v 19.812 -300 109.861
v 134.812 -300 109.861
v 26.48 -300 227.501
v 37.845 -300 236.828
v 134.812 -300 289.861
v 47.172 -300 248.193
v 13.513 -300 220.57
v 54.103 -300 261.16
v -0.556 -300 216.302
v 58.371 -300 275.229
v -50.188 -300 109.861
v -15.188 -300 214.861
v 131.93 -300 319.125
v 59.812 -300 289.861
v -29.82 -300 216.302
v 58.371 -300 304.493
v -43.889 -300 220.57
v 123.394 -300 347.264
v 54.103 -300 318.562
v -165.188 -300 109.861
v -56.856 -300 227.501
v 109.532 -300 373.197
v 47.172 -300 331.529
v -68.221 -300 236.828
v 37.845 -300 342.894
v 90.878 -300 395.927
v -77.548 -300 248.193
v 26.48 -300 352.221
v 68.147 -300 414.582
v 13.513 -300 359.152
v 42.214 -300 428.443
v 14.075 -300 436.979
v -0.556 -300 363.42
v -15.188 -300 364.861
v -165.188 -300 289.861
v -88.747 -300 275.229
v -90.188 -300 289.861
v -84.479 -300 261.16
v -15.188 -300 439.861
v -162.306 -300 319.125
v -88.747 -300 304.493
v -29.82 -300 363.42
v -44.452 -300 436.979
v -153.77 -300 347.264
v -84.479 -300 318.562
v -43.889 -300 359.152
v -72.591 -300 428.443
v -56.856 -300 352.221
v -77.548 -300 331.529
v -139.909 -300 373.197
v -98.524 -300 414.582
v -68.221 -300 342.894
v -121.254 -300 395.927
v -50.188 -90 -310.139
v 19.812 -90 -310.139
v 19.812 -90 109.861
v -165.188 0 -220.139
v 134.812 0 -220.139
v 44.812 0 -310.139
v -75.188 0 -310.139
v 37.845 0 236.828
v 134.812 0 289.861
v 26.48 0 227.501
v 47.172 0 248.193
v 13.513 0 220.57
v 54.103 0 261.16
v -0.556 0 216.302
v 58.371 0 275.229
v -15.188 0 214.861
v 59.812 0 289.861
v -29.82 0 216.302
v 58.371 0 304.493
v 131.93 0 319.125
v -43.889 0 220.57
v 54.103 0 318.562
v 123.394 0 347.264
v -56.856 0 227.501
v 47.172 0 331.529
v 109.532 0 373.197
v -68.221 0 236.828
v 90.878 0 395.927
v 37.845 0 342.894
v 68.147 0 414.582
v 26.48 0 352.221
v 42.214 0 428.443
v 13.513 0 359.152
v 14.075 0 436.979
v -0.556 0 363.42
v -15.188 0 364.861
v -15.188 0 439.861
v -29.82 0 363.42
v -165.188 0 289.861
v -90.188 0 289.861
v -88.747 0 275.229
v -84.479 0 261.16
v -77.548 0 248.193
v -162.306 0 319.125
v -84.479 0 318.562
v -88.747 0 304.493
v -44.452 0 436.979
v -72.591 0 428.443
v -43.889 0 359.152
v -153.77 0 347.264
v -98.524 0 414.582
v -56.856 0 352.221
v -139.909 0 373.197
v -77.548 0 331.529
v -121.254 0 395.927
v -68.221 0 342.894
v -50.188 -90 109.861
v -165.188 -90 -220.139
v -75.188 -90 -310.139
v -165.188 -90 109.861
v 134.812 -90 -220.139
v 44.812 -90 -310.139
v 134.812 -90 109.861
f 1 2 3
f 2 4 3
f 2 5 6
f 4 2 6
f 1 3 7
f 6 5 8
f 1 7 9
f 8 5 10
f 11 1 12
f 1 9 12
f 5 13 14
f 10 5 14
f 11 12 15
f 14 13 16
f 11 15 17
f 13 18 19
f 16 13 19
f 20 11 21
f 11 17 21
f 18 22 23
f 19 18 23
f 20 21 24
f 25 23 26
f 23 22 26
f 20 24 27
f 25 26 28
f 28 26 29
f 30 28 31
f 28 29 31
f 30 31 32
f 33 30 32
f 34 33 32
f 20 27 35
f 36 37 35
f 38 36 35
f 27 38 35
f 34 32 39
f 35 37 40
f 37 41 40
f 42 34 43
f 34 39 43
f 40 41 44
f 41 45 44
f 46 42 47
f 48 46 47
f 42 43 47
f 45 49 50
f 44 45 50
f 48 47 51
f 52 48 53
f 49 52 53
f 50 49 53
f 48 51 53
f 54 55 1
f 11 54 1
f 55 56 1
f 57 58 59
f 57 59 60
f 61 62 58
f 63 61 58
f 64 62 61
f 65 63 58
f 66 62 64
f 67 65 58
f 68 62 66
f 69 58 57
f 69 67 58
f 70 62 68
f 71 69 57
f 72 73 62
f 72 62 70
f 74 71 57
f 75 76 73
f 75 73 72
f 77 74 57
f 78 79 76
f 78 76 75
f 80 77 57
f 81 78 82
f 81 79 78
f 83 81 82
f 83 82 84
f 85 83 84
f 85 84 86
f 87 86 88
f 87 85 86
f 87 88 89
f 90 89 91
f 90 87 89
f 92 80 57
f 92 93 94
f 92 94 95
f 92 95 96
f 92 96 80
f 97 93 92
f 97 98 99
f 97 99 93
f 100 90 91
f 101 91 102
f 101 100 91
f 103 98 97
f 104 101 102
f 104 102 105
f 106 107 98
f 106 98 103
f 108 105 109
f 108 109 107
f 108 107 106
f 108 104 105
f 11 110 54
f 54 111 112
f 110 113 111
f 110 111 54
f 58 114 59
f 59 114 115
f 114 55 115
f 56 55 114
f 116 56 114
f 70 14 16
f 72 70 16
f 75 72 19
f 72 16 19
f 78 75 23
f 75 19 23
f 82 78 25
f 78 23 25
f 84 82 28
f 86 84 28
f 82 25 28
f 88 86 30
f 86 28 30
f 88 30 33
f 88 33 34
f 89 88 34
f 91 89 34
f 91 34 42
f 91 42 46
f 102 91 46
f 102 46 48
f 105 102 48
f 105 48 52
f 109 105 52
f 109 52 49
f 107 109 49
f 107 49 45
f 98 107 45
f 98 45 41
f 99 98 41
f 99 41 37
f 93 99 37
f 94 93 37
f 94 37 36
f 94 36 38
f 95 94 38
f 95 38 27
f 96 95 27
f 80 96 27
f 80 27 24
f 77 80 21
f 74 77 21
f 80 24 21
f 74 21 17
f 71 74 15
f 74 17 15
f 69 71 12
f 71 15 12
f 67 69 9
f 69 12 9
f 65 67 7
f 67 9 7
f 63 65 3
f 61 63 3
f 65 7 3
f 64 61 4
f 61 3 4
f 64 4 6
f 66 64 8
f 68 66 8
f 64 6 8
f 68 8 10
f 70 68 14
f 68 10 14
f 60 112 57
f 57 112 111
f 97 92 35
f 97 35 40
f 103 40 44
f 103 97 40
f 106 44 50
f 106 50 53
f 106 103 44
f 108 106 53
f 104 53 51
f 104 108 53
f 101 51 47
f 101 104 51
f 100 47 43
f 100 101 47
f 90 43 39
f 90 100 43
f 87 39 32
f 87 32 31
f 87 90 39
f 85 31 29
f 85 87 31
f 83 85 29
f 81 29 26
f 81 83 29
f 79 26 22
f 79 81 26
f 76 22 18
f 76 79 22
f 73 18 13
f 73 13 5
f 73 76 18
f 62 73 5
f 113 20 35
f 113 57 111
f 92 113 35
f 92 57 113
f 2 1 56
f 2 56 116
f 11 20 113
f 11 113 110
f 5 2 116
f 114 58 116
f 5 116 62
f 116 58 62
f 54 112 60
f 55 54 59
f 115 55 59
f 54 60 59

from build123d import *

# Parameters (mm, degrees)
F0_W      = 300
F0_H      = 600
F1_DEPTH  = 90
F3_DEPTH  = 300
F4_W      = 300
F4_H      = 180
F5_DEPTH  = 210
F6_R      = 75
F7_DEPTH  = 300
F9_W      = 70
F9_H      = 210
F10_DEPTH = 420
F12_DEPTH = 70
F14_DEPTH = 90
F16_DEPTH = 90


with BuildPart() as f1:
    # F0 (on Front) → F1 (new body)
    with BuildSketch(Plane.XZ):
        with Locations((-15.188207, -10.138799)):
            Rectangle(F0_W, F0_H)
    extrude(amount=F1_DEPTH)


with BuildPart() as f3:
    # F2 (on face) → F3 (new body)
    with BuildSketch(Plane(origin=(0, 0, 0), x_dir=(-1, 0, 0), z_dir=(0, 1, 0))):
        with BuildLine():
            Line((-134.811793, 289.861201), (165.188207, 289.861201))
            ThreePointArc((165.188207, 289.861201), (15.188207, 439.861201), (-134.811793, 289.861201))
        make_face()
    extrude(amount=-F3_DEPTH)


with BuildPart() as f5:
    # F4 (on face) → F5 (new body)
    with BuildSketch(Plane.XZ.offset(90)):
        with Locations((-15.188207, 199.861201)):
            Rectangle(F4_W, F4_H)
    extrude(amount=F5_DEPTH)


with BuildPart() as f7_tool:
    # F6 (on face) → F7 (new body)
    with BuildSketch(Plane.XZ.offset(300)):
        with Locations((-15.188207, 289.861201)):
            Circle(F6_R)
    extrude(amount=-F7_DEPTH)


with BuildPart() as f1_1:
    add(f1.part)

    # F7: cut by f7_tool
    add(f7_tool.part, mode=Mode.SUBTRACT)


with BuildPart() as f3_1:
    add(f3.part)

    # F7: cut by f7_tool
    add(f7_tool.part, mode=Mode.SUBTRACT)


with BuildPart() as f5_1:
    add(f5.part)

    # F7: cut by f7_tool
    add(f7_tool.part, mode=Mode.SUBTRACT)


with BuildPart() as f1_2:
    add(f1_1.part)

    # F8: union F5, F3
    add(f5_1.part)
    add(f3_1.part)

    # F9 (on face) → F10 (join)
    with BuildSketch(Plane(origin=(0, 0, 109.861201), x_dir=(1, 0, 0), z_dir=(0, 0, -1))):
        with Locations((-15.188207, 195)):
            Rectangle(F9_W, F9_H)
    extrude(amount=F10_DEPTH)

    # F11 (on face) → F12 (cut)
    with BuildSketch(Plane.YZ.offset(19.811793)):
        Polygon((-300, -310.138799), (-90, -310.138799), (-300, 109.861201), align=None)
    extrude(amount=-F12_DEPTH, mode=Mode.SUBTRACT)

    # F13 (on face) → F14 (cut)
    with BuildSketch(Plane.XZ.offset(90)):
        Polygon((-75.188207, -310.138799), (-165.188207, -220.138799), (-165.188207, -310.138799), align=None)
    extrude(amount=-F14_DEPTH, mode=Mode.SUBTRACT)

    # F15 (on face) → F16 (cut)
    with BuildSketch(Plane.XZ.offset(90)):
        Polygon((44.811793, -310.138799), (134.811793, -310.138799), (134.811793, -220.138799), align=None)
    extrude(amount=-F16_DEPTH, mode=Mode.SUBTRACT)


solid = f1_2.part
